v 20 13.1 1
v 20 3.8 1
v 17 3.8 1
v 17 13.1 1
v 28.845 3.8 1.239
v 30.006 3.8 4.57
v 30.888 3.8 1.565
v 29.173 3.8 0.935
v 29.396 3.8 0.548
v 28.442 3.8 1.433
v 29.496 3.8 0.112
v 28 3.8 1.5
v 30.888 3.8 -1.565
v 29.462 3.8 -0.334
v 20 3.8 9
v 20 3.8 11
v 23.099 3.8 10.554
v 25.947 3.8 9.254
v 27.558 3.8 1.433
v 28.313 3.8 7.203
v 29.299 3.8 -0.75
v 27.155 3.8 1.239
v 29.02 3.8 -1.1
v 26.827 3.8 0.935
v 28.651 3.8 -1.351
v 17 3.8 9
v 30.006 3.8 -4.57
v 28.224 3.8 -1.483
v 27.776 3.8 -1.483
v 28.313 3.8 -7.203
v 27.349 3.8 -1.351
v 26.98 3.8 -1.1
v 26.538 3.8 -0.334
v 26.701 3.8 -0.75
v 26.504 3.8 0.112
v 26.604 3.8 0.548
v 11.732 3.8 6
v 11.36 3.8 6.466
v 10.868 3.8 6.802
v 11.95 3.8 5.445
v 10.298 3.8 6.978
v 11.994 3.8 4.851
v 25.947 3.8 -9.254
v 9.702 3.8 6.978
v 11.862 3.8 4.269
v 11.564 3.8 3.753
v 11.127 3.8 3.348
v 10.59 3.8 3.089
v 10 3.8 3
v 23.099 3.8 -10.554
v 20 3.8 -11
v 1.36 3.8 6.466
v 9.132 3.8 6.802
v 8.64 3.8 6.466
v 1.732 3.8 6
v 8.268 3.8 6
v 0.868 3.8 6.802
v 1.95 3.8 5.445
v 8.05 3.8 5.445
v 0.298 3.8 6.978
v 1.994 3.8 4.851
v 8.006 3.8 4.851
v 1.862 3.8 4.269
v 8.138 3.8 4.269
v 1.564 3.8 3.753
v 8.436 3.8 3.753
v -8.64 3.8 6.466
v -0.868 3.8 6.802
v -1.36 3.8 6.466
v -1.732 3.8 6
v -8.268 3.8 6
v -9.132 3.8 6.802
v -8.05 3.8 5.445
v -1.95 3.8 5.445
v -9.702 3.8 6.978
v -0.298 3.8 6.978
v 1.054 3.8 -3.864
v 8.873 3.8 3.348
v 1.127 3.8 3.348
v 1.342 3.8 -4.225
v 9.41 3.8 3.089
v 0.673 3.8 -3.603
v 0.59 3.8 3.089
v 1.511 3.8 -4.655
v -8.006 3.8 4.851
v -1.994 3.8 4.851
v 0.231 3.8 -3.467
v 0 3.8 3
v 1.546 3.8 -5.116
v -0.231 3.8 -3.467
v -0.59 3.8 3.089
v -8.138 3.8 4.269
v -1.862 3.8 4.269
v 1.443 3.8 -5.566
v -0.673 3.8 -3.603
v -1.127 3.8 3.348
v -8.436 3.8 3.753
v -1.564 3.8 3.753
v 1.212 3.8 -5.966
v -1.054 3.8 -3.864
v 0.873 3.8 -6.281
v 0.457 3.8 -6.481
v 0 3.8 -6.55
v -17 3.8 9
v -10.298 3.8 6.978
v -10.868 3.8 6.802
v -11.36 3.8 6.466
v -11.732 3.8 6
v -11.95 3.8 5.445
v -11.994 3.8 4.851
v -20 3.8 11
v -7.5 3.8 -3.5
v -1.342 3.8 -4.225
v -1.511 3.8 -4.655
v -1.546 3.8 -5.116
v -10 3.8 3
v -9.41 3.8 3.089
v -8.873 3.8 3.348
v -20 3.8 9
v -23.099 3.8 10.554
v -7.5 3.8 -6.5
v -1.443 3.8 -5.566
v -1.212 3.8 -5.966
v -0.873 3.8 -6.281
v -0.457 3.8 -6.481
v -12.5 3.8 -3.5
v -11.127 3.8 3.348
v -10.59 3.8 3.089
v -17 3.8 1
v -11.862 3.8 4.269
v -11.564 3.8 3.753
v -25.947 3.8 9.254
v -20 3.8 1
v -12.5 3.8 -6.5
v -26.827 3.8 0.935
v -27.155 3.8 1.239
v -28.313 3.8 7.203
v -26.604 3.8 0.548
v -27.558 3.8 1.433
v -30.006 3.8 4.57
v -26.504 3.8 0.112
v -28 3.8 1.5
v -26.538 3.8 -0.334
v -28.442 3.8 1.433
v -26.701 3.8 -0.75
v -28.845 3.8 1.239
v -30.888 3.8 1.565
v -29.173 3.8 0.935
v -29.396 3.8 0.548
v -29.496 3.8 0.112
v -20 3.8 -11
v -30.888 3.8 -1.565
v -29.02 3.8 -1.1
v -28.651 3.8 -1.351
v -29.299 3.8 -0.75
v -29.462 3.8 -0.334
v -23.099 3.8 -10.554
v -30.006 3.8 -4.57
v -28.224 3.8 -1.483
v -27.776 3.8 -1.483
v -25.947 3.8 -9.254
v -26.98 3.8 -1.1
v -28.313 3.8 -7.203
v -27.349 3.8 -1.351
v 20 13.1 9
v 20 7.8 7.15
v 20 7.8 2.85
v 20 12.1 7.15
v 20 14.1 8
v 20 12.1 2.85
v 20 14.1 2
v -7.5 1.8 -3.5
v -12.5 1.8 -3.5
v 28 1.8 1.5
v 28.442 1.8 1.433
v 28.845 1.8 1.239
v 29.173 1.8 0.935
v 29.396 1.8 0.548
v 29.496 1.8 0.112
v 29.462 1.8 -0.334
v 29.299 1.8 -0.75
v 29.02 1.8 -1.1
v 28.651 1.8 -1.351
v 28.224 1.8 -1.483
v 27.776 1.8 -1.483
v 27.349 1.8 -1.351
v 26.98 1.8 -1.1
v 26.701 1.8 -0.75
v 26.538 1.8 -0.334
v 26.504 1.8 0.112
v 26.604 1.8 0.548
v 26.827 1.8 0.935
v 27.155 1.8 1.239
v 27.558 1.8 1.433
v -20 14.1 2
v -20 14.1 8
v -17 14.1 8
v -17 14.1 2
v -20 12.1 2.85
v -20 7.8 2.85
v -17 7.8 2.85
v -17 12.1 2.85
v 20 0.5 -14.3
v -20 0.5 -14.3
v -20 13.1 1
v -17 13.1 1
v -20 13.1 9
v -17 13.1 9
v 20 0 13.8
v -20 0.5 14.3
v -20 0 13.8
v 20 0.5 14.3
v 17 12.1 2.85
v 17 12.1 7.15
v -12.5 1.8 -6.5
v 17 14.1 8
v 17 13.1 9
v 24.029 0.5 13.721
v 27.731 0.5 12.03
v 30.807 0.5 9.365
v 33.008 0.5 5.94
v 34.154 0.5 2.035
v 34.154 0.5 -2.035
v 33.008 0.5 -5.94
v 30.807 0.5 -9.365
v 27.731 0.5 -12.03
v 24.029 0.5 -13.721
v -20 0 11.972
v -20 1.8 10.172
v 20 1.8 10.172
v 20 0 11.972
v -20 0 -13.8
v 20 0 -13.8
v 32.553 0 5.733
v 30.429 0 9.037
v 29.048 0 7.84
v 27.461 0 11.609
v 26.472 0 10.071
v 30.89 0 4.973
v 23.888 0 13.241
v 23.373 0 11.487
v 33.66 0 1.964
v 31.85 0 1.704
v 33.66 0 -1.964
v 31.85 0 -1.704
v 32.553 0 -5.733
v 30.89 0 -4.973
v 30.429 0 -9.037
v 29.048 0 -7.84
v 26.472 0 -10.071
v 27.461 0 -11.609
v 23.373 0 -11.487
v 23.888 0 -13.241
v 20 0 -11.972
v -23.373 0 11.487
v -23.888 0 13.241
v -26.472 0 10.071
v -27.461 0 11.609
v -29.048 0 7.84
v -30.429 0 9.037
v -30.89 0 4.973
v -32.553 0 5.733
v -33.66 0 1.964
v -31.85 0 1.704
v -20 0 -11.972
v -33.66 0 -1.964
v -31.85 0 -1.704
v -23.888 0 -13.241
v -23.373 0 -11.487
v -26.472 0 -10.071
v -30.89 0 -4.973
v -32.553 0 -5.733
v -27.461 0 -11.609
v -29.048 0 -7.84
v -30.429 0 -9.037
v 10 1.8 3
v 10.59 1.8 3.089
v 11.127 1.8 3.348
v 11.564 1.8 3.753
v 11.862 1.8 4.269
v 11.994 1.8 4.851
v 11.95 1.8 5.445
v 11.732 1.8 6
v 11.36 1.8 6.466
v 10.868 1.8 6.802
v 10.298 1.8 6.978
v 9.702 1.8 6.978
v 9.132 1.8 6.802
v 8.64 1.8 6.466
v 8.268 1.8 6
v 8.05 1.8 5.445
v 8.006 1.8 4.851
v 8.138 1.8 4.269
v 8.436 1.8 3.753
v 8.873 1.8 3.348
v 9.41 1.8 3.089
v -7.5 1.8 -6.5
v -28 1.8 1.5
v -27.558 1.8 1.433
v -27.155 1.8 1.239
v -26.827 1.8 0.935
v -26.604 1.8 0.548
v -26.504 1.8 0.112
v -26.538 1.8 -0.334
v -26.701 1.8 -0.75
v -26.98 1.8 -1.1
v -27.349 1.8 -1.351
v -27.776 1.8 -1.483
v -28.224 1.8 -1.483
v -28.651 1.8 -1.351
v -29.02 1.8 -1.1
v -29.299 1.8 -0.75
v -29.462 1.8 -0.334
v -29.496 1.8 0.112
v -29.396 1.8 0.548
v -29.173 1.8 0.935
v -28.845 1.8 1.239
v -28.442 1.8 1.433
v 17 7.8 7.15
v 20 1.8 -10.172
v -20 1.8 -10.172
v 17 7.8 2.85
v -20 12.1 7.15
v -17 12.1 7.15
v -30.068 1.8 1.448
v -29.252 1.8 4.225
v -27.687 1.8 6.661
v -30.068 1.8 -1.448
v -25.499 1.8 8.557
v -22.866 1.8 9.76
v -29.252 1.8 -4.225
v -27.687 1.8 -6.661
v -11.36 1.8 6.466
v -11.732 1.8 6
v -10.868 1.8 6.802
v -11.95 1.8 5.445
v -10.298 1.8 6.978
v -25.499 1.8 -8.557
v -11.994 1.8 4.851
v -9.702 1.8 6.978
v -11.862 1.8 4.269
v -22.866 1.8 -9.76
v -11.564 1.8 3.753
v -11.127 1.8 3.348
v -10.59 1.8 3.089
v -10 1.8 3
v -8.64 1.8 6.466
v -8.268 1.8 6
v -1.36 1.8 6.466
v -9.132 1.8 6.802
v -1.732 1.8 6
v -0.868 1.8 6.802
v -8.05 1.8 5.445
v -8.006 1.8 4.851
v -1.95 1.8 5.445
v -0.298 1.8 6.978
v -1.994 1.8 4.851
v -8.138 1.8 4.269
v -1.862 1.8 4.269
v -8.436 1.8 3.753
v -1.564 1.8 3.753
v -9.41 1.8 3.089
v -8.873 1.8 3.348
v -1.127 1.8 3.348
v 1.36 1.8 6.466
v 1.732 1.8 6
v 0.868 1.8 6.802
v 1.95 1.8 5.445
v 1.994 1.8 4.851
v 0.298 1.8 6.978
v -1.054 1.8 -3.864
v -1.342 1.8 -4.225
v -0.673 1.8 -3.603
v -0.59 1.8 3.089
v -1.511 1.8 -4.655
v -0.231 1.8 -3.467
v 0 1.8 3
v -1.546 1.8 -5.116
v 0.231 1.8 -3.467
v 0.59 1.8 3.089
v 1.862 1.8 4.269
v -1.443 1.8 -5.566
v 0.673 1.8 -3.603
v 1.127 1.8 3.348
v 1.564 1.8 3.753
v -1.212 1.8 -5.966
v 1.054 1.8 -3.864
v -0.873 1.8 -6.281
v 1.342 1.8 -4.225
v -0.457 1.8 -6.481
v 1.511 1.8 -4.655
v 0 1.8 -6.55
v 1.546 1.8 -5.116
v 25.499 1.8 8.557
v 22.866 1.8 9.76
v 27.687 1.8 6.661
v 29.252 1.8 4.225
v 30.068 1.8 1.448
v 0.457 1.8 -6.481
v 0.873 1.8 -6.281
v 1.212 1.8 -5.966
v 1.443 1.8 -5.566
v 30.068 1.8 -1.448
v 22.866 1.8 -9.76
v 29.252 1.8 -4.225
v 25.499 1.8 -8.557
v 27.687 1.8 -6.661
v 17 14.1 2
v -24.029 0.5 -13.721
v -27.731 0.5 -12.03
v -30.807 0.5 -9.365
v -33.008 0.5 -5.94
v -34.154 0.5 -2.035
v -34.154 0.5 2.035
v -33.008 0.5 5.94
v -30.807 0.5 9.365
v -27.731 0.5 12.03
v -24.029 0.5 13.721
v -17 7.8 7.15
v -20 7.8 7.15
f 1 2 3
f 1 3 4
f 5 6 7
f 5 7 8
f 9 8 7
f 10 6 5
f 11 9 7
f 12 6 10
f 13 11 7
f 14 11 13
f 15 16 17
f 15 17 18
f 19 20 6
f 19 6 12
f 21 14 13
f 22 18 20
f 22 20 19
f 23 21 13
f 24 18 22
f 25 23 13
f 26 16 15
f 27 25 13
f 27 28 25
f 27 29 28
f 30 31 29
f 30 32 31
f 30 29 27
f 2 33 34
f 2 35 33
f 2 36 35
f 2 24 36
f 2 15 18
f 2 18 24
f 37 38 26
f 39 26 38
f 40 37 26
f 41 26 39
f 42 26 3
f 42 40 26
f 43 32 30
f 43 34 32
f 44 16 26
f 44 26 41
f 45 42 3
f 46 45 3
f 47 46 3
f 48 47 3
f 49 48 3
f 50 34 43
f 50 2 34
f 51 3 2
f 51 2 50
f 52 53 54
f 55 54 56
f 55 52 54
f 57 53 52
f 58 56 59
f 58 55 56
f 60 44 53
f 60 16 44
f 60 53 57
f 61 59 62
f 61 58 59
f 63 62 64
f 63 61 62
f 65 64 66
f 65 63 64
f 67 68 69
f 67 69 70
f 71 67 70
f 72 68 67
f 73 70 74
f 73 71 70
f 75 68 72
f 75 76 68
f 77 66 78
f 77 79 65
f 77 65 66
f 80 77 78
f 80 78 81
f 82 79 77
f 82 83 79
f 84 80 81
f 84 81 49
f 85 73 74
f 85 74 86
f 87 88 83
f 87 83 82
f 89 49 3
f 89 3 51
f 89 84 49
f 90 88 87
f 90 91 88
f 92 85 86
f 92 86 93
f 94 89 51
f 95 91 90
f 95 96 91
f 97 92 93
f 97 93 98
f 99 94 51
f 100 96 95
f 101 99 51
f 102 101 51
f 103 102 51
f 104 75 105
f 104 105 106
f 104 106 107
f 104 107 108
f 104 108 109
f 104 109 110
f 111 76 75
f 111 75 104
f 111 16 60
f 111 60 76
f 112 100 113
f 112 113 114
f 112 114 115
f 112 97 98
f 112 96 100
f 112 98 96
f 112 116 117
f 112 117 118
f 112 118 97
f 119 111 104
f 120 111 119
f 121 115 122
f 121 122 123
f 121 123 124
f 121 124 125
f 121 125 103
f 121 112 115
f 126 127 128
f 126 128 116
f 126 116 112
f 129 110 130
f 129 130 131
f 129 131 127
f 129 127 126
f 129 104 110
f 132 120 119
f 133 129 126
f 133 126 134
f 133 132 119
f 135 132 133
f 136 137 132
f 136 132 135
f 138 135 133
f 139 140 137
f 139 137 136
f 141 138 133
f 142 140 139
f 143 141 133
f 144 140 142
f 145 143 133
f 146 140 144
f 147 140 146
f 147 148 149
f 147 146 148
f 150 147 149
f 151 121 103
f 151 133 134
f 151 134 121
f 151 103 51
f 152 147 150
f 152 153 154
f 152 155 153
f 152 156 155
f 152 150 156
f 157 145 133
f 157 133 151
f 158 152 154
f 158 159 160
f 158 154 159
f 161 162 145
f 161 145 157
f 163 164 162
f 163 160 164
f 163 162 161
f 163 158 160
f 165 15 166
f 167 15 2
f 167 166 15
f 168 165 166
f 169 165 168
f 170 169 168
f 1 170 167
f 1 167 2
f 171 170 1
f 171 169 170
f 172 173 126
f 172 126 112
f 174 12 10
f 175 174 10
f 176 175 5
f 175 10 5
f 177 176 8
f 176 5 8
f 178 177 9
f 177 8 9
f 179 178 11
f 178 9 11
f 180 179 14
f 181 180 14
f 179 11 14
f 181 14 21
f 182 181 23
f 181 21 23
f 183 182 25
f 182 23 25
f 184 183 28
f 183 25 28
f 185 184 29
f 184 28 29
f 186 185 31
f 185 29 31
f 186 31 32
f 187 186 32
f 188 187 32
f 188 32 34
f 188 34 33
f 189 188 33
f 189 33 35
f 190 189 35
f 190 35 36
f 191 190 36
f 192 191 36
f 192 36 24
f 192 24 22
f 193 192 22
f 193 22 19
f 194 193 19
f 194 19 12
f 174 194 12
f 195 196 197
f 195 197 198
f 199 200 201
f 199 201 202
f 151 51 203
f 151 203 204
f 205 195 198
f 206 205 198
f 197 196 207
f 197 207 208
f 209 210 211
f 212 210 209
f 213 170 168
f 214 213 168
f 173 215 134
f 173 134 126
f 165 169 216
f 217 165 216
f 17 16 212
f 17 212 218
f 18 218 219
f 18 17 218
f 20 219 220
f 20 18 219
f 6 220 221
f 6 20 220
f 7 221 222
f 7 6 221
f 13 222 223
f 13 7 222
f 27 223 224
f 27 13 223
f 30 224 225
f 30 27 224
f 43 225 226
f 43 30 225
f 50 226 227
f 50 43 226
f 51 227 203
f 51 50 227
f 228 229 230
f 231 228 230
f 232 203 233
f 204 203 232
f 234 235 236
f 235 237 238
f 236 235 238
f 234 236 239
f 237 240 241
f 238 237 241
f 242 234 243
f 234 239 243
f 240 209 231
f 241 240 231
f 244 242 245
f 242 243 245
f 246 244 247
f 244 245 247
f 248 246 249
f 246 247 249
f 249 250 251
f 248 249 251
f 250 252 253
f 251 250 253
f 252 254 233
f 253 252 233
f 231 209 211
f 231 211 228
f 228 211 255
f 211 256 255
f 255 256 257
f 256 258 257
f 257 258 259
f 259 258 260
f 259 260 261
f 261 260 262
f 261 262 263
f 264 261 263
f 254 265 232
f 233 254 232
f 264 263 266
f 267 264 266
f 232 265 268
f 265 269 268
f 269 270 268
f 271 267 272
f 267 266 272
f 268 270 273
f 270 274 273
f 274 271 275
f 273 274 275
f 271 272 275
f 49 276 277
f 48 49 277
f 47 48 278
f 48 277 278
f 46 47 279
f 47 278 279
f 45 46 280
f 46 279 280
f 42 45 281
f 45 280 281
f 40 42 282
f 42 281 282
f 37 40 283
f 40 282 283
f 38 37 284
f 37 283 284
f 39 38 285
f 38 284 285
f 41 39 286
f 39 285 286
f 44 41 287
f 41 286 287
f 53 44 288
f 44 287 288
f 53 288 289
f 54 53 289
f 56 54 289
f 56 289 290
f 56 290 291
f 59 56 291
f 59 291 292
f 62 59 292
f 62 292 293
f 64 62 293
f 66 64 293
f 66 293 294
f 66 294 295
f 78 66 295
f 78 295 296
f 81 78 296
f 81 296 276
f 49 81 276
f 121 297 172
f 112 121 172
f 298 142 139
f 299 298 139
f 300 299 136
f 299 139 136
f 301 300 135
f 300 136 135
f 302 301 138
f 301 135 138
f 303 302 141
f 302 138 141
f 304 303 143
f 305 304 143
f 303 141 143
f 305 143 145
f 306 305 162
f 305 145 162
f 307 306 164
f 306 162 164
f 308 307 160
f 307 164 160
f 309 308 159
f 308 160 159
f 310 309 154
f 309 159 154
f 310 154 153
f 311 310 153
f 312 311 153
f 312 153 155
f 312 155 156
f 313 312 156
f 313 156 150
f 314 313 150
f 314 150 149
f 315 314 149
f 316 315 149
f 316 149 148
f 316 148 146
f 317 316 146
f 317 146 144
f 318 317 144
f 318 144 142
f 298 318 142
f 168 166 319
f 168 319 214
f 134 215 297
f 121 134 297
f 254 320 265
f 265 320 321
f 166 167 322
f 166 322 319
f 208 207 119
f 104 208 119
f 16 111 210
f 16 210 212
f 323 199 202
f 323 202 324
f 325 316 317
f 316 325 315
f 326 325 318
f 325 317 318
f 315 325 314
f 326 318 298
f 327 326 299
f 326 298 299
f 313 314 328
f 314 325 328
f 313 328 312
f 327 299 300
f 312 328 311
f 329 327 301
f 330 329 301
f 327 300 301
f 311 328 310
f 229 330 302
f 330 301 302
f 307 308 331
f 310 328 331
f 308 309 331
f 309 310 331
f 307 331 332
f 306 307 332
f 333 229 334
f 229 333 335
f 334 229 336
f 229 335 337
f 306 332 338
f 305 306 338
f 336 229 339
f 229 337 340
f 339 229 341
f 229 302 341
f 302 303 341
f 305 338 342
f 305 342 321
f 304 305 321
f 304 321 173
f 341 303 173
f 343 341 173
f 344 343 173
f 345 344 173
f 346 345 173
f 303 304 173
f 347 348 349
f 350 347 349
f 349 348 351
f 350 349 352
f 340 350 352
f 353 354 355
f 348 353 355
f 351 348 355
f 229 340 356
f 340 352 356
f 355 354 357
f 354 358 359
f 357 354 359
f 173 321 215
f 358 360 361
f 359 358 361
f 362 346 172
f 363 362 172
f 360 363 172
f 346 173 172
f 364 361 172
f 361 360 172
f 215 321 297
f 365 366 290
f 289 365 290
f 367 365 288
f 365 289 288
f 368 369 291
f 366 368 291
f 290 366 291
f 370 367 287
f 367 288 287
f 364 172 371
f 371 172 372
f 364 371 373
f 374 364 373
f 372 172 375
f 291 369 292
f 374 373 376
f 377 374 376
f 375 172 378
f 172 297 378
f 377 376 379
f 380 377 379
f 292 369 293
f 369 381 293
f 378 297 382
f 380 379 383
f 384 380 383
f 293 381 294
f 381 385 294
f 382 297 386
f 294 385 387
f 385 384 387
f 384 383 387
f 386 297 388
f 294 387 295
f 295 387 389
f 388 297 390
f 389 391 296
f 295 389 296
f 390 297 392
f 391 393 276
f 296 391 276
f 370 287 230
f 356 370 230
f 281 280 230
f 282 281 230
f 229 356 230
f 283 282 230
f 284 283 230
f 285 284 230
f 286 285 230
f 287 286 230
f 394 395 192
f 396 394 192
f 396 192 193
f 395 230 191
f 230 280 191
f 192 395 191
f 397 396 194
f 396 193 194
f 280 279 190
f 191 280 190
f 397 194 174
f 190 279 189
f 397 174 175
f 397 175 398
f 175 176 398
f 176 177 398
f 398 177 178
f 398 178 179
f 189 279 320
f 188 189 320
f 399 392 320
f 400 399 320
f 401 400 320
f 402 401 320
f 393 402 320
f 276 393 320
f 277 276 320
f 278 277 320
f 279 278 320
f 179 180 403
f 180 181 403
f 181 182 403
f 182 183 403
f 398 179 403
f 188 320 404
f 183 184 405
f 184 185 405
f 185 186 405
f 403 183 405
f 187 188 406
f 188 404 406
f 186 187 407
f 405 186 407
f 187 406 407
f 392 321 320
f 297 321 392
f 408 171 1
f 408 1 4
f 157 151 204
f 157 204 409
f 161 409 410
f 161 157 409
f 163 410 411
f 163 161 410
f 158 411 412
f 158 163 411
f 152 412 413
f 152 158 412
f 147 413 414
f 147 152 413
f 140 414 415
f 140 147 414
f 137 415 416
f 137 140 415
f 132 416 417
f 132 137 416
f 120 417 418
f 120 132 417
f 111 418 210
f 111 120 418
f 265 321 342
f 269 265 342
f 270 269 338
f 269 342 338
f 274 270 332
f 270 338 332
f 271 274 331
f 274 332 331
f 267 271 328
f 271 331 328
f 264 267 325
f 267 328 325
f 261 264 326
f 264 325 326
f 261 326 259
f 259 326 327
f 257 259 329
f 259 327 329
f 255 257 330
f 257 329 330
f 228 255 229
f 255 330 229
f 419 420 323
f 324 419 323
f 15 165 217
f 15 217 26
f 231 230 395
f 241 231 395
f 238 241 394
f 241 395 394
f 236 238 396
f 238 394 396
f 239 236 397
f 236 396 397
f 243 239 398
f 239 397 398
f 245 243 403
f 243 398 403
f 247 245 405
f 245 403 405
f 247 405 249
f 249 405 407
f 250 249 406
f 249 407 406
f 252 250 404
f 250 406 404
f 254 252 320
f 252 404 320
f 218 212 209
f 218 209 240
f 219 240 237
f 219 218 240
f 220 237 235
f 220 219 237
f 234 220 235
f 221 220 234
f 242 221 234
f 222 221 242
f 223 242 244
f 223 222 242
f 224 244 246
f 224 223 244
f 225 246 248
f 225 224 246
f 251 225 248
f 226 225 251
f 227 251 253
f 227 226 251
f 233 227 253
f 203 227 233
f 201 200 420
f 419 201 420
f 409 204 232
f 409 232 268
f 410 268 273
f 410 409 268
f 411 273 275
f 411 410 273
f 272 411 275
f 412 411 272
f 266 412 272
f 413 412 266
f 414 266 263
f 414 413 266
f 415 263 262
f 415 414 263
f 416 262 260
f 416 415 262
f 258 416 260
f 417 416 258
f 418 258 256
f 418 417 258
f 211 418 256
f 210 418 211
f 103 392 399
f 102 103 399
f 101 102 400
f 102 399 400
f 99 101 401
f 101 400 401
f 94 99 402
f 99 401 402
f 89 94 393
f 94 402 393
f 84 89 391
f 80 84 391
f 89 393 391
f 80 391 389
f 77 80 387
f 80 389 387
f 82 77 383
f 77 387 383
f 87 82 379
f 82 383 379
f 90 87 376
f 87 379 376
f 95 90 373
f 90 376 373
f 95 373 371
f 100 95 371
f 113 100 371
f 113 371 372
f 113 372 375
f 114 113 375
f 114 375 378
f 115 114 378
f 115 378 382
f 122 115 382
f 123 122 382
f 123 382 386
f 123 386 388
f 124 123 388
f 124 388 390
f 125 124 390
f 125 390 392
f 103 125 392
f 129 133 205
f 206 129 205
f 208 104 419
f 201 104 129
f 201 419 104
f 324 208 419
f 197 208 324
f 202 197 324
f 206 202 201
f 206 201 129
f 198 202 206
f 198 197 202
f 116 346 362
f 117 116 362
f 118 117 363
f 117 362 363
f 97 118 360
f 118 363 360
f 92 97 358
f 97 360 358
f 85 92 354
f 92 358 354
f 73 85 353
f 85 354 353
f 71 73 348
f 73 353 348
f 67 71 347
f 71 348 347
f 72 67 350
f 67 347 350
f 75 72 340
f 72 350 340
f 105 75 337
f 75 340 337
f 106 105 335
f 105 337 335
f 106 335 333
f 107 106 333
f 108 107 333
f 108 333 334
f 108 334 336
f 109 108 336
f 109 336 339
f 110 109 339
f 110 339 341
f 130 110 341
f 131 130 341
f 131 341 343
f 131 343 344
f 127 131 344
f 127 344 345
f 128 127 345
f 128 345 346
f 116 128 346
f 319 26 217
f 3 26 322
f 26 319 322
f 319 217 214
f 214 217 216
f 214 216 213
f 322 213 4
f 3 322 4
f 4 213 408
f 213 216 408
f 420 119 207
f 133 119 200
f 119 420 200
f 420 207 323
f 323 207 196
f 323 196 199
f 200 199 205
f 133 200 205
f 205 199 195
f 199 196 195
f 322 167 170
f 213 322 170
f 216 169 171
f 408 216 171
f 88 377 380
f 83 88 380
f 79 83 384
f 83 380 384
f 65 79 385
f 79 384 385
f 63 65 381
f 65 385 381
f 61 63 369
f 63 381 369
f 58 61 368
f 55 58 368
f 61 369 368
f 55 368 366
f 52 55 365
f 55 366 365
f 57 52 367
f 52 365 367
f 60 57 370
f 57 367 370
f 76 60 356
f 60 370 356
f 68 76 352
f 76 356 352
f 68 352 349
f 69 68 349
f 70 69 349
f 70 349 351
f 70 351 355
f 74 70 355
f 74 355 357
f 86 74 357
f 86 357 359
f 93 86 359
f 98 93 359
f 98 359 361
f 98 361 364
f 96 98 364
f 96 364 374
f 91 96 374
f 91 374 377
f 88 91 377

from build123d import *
from OCP.BRepFilletAPI import BRepFilletAPI_MakeChamfer

# Parameters (mm, degrees)
BOSS_EXTRU_1_DEPTH           = 3.8
BOSS_EXTRU_1_TAPER           = 45
COQUE2_DEPTH                 = 1.8
COQUE2_DRAFT                 = 45
CHANFREIN1_SIZE              = 1
CHANFREIN1_SIZE2             = 0.707106781
ENL_V_MAT_EXTRU_1_REACH      = 39.355
ESQUISSE2_R                  = 1.5
ENL_V_MAT_EXTRU_2_REACH      = 39.215
ESQUISSE3_R                  = 1.55
ESQUISSE3_R_2                = 2
ESQUISSE3_W                  = 5
ESQUISSE3_H                  = 3
ESQUISSE4_W                  = 4.3
ESQUISSE4_H                  = 4.3
BOSS_EXTRU_2_DEPTH           = 3
CHANFREIN2_SIZE              = 1
CHANFREIN2_OF_SYM_TRIE1_SIZE = 1


# Read off the part's stored shape, not the designer's step: Coque2
with BuildPart() as part:
    # Esquisse1 → Boss.-Extru.1 (new body)
    with BuildSketch(Plane(origin=(0, 0, 0), x_dir=(1, 0, 0), z_dir=(0, 1, 0))):
        with BuildLine():
            ThreePointArc((-20, 14.8), (-34.8, 0), (-20, -14.8))
            Line((-20, -14.8), (20, -14.8))
            ThreePointArc((20, -14.8), (34.8, 0), (20, 14.8))
            Line((20, 14.8), (-20, 14.8))
        make_face()
    extrude(amount=BOSS_EXTRU_1_DEPTH, taper=BOSS_EXTRU_1_TAPER)


with BuildPart() as coque2_tool:
    # Coque2 outline → Coque2 (with draft: the straight prism first)
    with BuildSketch(Plane(origin=(0, 1.8, 0), x_dir=(1, 0, 0), z_dir=(0, 1, 0))):
        with BuildLine():
            Line((-20, -10.171572875), (20, -10.171572875))
            ThreePointArc((20, -10.171572875), (30.171572875, 0), (20, 10.171572875))
            Line((20, 10.171572875), (-20, 10.171572875))
            ThreePointArc((-20, 10.171572875), (-30.171572875, 0), (-20, -10.171572875))
        make_face()
    extrude(amount=-COQUE2_DEPTH)
    # Coque2: the draft: its side faces are tilted about the plane it starts from
    coque2_sides = [coque2_tool.faces().sort_by_distance(p)[0] for p in [
        (0, 0.9, 10.171572875),
        (30.171572875, 0.9, 0),
        (0, 0.9, -10.171572875),
        (-30.171572875, 0.9, 0),
    ]]
    draft(coque2_sides, Plane(origin=(0, 1.8, 0), x_dir=(1, 0, 0), z_dir=(0, 1, 0)), COQUE2_DRAFT)


with BuildPart() as part_1:
    add(part.part)

    # Coque2: cut by coque2_tool
    add(coque2_tool.part, mode=Mode.SUBTRACT)

    # Chanfrein1: one chamfer whose edges measure the first distance from different faces: ONE call of the kernel's chamfer builder (chamfer() names one face for all edges)
    chanfrein1_edges_1 = [part_1.edges().sort_by_distance(p)[0] for p in [
        (0, 0, -14.8),
        (0, 0, 14.8),
        (-34.8, 0, 0),
    ]]
    chanfrein1_side_1 = [part_1.faces().sort_by_distance(p)[0] for p in [
        (0, 0, -14.043672029),
    ]]
    chanfrein1_edges_2 = [part_1.edges().sort_by_distance(p)[0] for p in [
        (34.8, 0, 0),
    ]]
    chanfrein1_side_2 = [part_1.faces().sort_by_distance(p)[0] for p in [
        (32.9, 1.9, 0),
    ]]
    chanfrein1 = BRepFilletAPI_MakeChamfer(part_1.part.solid().wrapped)
    for e in chanfrein1_edges_1:
        chanfrein1.Add(CHANFREIN1_SIZE, CHANFREIN1_SIZE2, e.wrapped, chanfrein1_side_1[0].wrapped)  # the first distance lies on this face
    for e in chanfrein1_edges_2:
        chanfrein1.Add(CHANFREIN1_SIZE, CHANFREIN1_SIZE2, e.wrapped, chanfrein1_side_2[0].wrapped)  # the first distance lies on this face
    add(Compound.cast(chanfrein1.Shape()), mode=Mode.REPLACE)

    # Esquisse2 → Enlèv. mat.-Extru.1 (cut, up to next)
    with BuildSketch(Plane(origin=(0, 3.8, 0), x_dir=(1, 0, 0), z_dir=(0, 1, 0)), mode=Mode.PRIVATE) as enl_v_mat_extru_1_sk1:
        with Locations(Location((-28, 0, 0), (0, 0, 270))):
            Circle(ESQUISSE2_R)
    enl_v_mat_extru_1_tool1 = extrude(enl_v_mat_extru_1_sk1.sketch, amount=-ENL_V_MAT_EXTRU_1_REACH, mode=Mode.PRIVATE) & part_1.part
    # Esquisse2 → Enlèv. mat.-Extru.1 (cut, up to next)
    with BuildSketch(Plane(origin=(0, 3.8, 0), x_dir=(1, 0, 0), z_dir=(0, 1, 0)), mode=Mode.PRIVATE) as enl_v_mat_extru_1_sk2:
        with Locations(Location((28, 0, 0), (0, 0, 270))):
            Circle(ESQUISSE2_R)
    enl_v_mat_extru_1_tool2 = extrude(enl_v_mat_extru_1_sk2.sketch, amount=-ENL_V_MAT_EXTRU_1_REACH, mode=Mode.PRIVATE) & part_1.part
    add(enl_v_mat_extru_1_tool1.solids().sort_by_distance((-28, 3.8, 0))[0], mode=Mode.SUBTRACT)
    add(enl_v_mat_extru_1_tool2.solids().sort_by_distance((28, 3.8, 0))[0], mode=Mode.SUBTRACT)

    # Esquisse3 → Enlèv. mat.-Extru.2 (cut, up to next)
    with BuildSketch(Plane.XZ.offset(-1.8), mode=Mode.PRIVATE) as enl_v_mat_extru_2_sk1:
        with Locations(Location((0, -5, 0), (0, 0, 270))):
            Circle(ESQUISSE3_R)
    enl_v_mat_extru_2_tool1 = extrude(enl_v_mat_extru_2_sk1.sketch, amount=-ENL_V_MAT_EXTRU_2_REACH, mode=Mode.PRIVATE) & part_1.part
    # Esquisse3 → Enlèv. mat.-Extru.2 (cut, up to next)
    with BuildSketch(Plane.XZ.offset(-1.8), mode=Mode.PRIVATE) as enl_v_mat_extru_2_sk2:
        with Locations(Location((10, 5, 0), (0, 0, 270))):
            Circle(ESQUISSE3_R_2)
    enl_v_mat_extru_2_tool2 = extrude(enl_v_mat_extru_2_sk2.sketch, amount=-ENL_V_MAT_EXTRU_2_REACH, mode=Mode.PRIVATE) & part_1.part
    # Esquisse3 → Enlèv. mat.-Extru.2 (cut, up to next)
    with BuildSketch(Plane.XZ.offset(-1.8), mode=Mode.PRIVATE) as enl_v_mat_extru_2_sk3:
        with Locations(Location((0, 5, 0), (0, 0, 270))):
            Circle(ESQUISSE3_R_2)
    enl_v_mat_extru_2_tool3 = extrude(enl_v_mat_extru_2_sk3.sketch, amount=-ENL_V_MAT_EXTRU_2_REACH, mode=Mode.PRIVATE) & part_1.part
    # Esquisse3 → Enlèv. mat.-Extru.2 (cut, up to next)
    with BuildSketch(Plane.XZ.offset(-1.8), mode=Mode.PRIVATE) as enl_v_mat_extru_2_sk4:
        with Locations(Location((-10, 5, 0), (0, 0, 270))):
            Circle(ESQUISSE3_R_2)
    enl_v_mat_extru_2_tool4 = extrude(enl_v_mat_extru_2_sk4.sketch, amount=-ENL_V_MAT_EXTRU_2_REACH, mode=Mode.PRIVATE) & part_1.part
    # Esquisse3 → Enlèv. mat.-Extru.2 (cut, up to next)
    with BuildSketch(Plane.XZ.offset(-1.8), mode=Mode.PRIVATE) as enl_v_mat_extru_2_sk5:
        with Locations((-10, -5)):
            Rectangle(ESQUISSE3_W, ESQUISSE3_H)
    enl_v_mat_extru_2_tool5 = extrude(enl_v_mat_extru_2_sk5.sketch, amount=-ENL_V_MAT_EXTRU_2_REACH, mode=Mode.PRIVATE) & part_1.part
    add(enl_v_mat_extru_2_tool1.solids().sort_by_distance((0, 1.8, -5))[0], mode=Mode.SUBTRACT)
    add(enl_v_mat_extru_2_tool2.solids().sort_by_distance((10, 1.8, 5))[0], mode=Mode.SUBTRACT)
    add(enl_v_mat_extru_2_tool3.solids().sort_by_distance((0, 1.8, 5))[0], mode=Mode.SUBTRACT)
    add(enl_v_mat_extru_2_tool4.solids().sort_by_distance((-10, 1.8, 5))[0], mode=Mode.SUBTRACT)
    add(enl_v_mat_extru_2_tool5.solids().sort_by_distance((-10, 1.8, -5))[0], mode=Mode.SUBTRACT)

    # Esquisse4 → Boss.-Extru.2 (add)
    with BuildSketch(Plane.ZY.offset(-20)):
        Polygon((9, 3.8), (1, 3.8), (1, 14.1), (5, 14.1), (9, 14.1), align=None)
        with Locations((5, 9.95)):
            Rectangle(ESQUISSE4_W, ESQUISSE4_H, mode=Mode.SUBTRACT)
    boss_extru_2 = extrude(amount=BOSS_EXTRU_2_DEPTH)

    # Chanfrein2
    chanfrein2_edges = [part_1.edges().sort_by_distance(p)[0] for p in [
        (18.5, 14.1, 9),
        (18.5, 14.1, 1),
    ]]
    chamfer(chanfrein2_edges, length=CHANFREIN2_SIZE)

    # Symétrie1: Boss.-Extru.2 across plane
    add(boss_extru_2.mirror(Plane(origin=(0, 0, 0), x_dir=(0, 0, 1), z_dir=(1, 0, 0))))

    # Chanfrein2 of Symétrie1
    chanfrein2_of_sym_trie1_edges = [part_1.edges().sort_by_distance(p)[0] for p in [
        (-18.5, 14.1, 9),
        (-18.5, 14.1, 1),
    ]]
    chamfer(chanfrein2_of_sym_trie1_edges, length=CHANFREIN2_OF_SYM_TRIE1_SIZE)


solid = part_1.part
